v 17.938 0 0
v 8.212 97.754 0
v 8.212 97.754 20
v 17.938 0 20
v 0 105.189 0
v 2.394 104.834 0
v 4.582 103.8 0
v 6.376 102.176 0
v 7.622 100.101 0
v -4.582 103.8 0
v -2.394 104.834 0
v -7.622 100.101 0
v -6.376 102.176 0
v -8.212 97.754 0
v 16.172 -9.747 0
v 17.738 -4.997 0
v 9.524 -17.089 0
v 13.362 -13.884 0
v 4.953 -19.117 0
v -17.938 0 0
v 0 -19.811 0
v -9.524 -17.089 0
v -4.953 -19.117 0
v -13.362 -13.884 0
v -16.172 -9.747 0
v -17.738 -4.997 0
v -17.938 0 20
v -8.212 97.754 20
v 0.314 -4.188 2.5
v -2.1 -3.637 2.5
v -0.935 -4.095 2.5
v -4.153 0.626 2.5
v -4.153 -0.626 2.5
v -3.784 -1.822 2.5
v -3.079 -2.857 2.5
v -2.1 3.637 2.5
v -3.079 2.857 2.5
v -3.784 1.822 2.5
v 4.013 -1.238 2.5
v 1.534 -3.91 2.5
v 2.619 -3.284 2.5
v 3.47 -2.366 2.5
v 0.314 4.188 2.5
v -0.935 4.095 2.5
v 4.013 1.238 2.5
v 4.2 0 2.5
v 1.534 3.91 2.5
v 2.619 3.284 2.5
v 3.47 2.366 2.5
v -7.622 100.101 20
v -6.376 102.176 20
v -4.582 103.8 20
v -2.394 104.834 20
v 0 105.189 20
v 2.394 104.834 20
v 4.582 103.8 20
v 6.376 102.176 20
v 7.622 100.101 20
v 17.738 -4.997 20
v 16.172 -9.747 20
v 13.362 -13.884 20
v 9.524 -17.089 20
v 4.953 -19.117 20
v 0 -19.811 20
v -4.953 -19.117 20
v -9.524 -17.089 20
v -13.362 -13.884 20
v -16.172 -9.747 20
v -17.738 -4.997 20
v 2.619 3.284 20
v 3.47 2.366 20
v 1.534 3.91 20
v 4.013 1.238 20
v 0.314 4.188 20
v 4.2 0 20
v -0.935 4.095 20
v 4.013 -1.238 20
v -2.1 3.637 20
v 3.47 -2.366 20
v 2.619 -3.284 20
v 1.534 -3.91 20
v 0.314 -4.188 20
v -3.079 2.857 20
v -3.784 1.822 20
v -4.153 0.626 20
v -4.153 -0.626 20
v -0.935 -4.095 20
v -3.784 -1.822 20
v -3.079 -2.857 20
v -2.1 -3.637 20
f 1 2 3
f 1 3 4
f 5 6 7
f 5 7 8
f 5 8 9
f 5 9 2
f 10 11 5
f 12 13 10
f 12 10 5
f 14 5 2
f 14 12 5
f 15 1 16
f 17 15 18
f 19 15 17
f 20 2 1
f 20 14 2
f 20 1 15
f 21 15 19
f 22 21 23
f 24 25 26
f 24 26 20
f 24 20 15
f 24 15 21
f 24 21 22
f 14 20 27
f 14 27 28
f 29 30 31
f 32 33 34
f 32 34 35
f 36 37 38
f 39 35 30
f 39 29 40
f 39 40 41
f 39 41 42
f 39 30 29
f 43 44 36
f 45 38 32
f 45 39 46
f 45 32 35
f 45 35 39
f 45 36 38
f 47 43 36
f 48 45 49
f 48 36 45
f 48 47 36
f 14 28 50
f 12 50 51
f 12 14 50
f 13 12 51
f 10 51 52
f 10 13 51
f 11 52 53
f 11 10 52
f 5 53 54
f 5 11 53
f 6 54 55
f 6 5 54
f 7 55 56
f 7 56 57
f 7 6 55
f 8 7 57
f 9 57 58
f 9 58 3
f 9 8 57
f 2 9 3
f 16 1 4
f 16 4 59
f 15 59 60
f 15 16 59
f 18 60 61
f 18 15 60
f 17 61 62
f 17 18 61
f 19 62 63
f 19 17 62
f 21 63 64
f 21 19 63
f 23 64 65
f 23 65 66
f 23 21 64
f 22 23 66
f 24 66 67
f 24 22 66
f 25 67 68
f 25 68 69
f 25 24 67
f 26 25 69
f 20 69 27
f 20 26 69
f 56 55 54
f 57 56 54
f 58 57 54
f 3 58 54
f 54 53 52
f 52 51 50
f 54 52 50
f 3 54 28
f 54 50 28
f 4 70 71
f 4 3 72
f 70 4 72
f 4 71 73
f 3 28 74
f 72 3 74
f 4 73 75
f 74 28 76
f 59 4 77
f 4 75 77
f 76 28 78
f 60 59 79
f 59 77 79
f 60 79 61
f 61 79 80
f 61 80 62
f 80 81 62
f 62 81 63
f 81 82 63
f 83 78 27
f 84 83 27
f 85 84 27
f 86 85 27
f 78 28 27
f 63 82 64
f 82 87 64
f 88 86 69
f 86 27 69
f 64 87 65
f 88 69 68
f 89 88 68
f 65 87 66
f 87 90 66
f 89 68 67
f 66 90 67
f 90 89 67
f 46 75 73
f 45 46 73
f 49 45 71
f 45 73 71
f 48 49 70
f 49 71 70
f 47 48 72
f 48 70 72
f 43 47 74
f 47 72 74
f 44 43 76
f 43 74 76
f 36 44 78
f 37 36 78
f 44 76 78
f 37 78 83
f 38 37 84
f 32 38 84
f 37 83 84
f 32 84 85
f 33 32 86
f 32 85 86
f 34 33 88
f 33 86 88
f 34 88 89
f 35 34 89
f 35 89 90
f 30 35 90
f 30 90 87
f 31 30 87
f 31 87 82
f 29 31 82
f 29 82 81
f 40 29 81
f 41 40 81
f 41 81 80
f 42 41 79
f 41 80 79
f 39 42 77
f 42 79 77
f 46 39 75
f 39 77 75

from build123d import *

# Parameters (mm, degrees)
BOSS_EXTRUDE1_DEPTH = 20
SKETCH2_R           = 4.2
CUT_EXTRUDE1_DEPTH  = 17.5


with BuildPart() as part:
    # Sketch1 → Boss-Extrude1 (new body)
    with BuildSketch(Plane(origin=(0, 0, 0), x_dir=(0, 1, 0), z_dir=(0, 0, 1))):
        with BuildLine():
            Line((0, 17.937538258), (97.753832512, 8.211917185))
            ThreePointArc((97.753832512, 8.211917185), (105.189280841, 0), (97.753832512, -8.211917185))
            Line((97.753832512, -8.211917185), (0, -17.937538258))
            ThreePointArc((0, -17.937538258), (-19.810719159, 0), (0, 17.937538258))
        make_face()
    extrude(amount=BOSS_EXTRUDE1_DEPTH)

    # Sketch2 → Cut-Extrude1 (cut)
    with BuildSketch(Plane.XY.offset(20)):
        Circle(SKETCH2_R)
    extrude(amount=-CUT_EXTRUDE1_DEPTH, mode=Mode.SUBTRACT)


solid = part.part
